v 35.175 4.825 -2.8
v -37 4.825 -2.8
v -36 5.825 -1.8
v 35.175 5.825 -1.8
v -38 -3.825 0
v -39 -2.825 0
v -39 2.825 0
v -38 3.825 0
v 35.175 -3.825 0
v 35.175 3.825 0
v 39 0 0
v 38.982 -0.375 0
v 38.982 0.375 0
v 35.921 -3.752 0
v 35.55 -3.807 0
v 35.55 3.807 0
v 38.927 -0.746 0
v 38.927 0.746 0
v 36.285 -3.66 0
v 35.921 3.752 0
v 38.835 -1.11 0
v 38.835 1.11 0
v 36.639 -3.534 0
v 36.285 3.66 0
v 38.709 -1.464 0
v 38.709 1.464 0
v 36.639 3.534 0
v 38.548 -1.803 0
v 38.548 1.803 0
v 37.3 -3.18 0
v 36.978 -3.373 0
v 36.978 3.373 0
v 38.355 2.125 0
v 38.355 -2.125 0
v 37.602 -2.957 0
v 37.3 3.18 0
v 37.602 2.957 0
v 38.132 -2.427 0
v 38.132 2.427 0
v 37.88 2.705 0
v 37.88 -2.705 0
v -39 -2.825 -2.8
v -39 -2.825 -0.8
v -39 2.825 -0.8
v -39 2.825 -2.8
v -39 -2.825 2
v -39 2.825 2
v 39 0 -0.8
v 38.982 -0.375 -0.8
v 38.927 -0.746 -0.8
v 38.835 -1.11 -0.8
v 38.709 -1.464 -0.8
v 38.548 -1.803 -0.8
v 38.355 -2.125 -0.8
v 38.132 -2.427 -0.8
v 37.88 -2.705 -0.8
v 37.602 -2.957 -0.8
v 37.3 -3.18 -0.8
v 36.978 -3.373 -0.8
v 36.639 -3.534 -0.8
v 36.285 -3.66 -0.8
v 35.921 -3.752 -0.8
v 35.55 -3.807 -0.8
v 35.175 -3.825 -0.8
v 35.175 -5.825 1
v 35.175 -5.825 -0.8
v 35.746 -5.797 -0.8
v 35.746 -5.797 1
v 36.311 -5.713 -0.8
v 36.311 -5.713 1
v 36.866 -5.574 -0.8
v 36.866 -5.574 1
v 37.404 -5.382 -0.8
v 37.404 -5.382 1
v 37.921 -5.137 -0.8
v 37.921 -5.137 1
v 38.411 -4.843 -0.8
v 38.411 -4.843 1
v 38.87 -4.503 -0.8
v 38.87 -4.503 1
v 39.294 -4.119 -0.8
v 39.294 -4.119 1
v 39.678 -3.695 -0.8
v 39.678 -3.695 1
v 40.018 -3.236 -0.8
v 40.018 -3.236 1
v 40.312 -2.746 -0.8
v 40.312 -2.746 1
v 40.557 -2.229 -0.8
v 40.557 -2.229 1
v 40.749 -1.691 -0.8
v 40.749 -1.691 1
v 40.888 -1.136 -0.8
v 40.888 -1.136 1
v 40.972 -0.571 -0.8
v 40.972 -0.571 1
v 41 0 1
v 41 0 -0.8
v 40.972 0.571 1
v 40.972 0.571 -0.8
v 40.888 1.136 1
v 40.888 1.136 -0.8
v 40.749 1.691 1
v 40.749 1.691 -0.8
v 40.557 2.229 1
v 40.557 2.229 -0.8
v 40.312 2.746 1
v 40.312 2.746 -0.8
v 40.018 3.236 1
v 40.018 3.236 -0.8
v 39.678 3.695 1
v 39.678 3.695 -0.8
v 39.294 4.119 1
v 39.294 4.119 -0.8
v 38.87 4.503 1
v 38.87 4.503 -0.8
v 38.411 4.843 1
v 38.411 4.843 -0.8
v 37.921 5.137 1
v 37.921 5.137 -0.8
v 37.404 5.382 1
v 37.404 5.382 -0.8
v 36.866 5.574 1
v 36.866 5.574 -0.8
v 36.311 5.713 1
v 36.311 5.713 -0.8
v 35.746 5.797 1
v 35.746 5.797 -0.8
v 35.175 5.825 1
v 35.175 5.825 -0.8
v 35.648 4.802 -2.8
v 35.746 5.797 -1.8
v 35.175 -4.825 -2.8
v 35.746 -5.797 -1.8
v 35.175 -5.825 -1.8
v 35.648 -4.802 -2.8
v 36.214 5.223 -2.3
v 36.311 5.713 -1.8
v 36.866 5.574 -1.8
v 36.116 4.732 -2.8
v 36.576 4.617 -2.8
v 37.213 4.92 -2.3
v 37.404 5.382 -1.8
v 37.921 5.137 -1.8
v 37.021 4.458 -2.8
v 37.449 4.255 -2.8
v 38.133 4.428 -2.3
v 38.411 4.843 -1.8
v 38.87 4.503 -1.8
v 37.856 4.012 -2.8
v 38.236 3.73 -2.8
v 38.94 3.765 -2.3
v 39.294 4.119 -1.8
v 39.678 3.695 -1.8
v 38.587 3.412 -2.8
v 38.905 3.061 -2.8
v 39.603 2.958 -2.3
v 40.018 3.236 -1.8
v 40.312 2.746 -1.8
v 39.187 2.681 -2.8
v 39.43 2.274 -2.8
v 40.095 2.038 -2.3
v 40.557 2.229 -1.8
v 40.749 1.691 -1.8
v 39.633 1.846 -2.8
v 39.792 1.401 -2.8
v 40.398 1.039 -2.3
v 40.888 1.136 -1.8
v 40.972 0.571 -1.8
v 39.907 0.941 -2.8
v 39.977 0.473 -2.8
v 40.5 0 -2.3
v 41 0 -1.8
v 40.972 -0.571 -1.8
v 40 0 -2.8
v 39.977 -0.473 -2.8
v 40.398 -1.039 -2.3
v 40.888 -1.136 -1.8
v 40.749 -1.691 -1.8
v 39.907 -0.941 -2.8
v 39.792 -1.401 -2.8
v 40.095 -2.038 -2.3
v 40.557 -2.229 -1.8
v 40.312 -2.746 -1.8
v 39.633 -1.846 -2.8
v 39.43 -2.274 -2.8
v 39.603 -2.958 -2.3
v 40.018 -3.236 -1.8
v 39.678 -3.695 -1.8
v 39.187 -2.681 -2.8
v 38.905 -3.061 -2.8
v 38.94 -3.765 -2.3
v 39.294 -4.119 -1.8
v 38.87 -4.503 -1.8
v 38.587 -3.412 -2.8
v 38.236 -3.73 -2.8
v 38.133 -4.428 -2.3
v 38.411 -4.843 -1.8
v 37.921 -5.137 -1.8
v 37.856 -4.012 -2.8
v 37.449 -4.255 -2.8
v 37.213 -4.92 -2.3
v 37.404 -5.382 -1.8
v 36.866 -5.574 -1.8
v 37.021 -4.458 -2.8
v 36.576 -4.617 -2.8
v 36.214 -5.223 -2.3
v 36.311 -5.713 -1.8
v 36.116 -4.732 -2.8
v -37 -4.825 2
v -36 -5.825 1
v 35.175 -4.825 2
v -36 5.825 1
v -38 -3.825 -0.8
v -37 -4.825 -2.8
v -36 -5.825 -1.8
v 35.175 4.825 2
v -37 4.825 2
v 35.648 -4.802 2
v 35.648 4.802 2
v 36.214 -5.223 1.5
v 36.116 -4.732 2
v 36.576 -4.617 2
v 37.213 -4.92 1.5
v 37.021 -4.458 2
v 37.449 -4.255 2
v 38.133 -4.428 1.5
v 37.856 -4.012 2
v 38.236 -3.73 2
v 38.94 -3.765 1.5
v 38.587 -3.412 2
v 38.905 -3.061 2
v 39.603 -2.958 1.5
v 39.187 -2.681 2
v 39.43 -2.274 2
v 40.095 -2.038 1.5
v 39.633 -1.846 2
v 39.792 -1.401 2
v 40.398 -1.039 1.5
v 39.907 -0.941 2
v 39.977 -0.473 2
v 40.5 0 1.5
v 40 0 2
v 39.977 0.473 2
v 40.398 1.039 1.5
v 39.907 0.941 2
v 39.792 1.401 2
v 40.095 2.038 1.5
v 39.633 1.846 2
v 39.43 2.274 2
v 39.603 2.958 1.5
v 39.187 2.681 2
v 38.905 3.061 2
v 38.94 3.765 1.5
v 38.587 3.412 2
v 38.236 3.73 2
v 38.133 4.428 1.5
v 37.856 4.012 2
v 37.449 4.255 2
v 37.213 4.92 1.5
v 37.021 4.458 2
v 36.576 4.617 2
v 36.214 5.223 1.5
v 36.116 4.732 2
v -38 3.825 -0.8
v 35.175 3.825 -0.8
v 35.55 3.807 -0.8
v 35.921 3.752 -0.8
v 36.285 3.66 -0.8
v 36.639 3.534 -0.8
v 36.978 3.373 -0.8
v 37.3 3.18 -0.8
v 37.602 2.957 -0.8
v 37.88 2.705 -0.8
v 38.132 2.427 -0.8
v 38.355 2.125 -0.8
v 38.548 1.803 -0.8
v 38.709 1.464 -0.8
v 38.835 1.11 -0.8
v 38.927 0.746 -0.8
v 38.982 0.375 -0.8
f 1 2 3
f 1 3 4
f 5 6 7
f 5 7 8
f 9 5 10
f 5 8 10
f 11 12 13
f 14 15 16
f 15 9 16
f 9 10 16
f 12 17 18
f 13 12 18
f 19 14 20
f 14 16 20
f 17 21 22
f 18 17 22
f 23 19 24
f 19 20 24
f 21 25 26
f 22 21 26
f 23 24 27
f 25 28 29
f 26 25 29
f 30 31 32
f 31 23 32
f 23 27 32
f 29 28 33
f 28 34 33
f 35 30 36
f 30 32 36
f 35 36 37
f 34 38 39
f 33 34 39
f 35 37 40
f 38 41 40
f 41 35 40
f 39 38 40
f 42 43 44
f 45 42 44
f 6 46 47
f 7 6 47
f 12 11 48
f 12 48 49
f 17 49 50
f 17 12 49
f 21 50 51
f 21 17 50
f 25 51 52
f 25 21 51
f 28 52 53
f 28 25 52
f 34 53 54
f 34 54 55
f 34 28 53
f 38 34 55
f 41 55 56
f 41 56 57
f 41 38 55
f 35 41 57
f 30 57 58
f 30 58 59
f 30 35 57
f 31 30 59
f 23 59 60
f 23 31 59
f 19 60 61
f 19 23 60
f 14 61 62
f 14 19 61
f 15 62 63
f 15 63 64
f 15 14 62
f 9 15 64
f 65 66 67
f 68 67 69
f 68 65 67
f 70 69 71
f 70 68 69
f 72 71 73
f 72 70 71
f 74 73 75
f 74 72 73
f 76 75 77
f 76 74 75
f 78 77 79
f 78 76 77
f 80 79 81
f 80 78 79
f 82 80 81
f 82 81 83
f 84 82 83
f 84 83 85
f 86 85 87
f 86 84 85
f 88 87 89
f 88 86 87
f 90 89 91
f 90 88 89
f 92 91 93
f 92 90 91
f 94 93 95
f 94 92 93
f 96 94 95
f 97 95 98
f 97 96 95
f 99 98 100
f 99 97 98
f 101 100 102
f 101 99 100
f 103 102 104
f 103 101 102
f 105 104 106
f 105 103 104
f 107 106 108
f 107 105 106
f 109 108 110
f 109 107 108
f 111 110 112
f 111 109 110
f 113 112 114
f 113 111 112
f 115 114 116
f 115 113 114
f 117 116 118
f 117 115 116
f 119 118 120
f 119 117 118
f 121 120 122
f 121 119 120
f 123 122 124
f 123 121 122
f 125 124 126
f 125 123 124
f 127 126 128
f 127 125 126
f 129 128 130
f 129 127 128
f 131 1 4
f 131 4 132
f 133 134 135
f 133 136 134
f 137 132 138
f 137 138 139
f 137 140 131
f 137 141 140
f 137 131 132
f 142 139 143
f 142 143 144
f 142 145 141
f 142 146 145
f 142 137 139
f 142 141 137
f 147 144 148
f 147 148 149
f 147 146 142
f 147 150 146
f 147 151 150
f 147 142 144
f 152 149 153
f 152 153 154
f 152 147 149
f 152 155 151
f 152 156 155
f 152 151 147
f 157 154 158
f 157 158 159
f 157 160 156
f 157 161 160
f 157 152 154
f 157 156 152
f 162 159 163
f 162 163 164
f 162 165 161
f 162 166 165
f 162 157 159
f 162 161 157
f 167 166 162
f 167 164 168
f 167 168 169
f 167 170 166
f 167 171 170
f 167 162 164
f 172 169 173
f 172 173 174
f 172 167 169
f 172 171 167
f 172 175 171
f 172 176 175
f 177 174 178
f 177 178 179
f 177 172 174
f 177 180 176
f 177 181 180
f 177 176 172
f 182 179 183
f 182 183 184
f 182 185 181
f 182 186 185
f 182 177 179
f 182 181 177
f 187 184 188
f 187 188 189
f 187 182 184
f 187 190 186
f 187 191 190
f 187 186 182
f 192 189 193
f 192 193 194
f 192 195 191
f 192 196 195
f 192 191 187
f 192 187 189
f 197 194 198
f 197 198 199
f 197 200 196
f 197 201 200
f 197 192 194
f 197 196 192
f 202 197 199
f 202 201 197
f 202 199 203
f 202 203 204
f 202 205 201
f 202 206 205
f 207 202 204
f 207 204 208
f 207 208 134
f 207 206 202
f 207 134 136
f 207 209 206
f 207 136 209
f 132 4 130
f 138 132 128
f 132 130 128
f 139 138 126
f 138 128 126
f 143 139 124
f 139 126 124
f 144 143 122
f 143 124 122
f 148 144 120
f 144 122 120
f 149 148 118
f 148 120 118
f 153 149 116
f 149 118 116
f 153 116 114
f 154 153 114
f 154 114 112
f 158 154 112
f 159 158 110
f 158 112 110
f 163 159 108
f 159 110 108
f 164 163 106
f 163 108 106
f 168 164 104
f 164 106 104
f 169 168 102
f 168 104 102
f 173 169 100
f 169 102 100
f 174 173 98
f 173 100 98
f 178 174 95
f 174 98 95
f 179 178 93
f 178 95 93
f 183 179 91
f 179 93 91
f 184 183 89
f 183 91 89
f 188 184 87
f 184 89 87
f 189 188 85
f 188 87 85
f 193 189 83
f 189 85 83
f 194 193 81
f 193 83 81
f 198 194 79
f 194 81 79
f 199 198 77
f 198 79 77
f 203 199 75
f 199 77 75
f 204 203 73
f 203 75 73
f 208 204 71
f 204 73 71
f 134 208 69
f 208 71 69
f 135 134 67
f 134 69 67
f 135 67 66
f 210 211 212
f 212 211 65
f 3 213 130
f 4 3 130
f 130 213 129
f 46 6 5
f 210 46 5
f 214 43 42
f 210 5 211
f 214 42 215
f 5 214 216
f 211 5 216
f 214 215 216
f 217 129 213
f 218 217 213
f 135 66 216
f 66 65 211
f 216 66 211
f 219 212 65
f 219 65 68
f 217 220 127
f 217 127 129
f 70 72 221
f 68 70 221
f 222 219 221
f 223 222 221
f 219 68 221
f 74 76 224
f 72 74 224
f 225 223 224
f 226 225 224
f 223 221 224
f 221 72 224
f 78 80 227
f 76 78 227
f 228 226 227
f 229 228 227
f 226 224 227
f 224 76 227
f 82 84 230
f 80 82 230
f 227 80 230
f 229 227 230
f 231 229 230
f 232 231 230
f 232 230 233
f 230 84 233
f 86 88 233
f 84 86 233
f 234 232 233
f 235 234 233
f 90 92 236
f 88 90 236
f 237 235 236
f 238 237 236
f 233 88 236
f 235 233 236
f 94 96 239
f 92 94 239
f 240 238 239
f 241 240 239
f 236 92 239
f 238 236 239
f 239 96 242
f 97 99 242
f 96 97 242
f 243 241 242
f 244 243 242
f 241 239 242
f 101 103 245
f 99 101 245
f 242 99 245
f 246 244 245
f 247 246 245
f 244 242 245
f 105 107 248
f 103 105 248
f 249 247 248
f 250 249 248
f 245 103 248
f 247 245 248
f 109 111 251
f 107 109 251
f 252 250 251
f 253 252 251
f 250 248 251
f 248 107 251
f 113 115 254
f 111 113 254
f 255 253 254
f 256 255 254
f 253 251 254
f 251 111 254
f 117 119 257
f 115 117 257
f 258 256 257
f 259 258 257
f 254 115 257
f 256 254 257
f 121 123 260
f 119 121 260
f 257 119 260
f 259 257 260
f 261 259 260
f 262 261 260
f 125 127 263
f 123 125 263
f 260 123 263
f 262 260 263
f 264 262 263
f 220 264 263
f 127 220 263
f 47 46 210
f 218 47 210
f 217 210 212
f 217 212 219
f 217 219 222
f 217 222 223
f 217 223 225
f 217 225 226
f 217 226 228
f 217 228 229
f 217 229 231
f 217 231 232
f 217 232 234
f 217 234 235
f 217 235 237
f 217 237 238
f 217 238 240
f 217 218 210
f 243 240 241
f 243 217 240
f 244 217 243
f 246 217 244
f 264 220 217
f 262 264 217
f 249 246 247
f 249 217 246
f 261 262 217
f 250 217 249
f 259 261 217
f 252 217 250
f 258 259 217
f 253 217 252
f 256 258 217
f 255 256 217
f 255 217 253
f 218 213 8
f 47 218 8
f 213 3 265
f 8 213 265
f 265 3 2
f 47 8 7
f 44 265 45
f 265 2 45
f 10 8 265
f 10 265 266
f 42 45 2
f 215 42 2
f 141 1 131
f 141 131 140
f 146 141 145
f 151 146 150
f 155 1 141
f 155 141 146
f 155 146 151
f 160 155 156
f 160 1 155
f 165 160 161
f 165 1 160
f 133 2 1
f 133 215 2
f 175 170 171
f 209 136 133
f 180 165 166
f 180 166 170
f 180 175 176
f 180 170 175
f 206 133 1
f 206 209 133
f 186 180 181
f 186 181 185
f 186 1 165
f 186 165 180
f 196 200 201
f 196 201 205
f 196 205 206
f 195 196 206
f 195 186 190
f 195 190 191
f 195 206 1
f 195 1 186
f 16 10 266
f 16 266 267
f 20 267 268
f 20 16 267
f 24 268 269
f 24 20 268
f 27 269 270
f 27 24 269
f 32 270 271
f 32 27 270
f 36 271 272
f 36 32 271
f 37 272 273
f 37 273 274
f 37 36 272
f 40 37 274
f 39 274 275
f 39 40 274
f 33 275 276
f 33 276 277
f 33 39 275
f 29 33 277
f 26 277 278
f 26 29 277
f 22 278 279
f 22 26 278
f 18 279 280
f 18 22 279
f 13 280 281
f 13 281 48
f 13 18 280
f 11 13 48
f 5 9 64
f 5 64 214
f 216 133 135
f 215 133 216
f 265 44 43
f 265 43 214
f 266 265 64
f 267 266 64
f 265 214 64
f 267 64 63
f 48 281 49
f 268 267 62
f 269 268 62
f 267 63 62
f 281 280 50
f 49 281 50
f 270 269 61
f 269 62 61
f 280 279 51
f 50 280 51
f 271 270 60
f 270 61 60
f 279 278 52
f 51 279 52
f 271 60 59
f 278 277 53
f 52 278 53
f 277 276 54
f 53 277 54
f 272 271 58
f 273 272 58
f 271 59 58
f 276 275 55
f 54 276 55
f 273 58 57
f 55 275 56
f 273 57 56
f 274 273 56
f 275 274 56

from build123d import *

# Parameters (mm, degrees)
F1_DEPTH    = 2
F2_DEPTH    = 0.8
F4_DEPTH    = 2
F5_SIZE     = 1
F6_T1_DEPTH = 18.2300979278


# Not quite as in the source:
# - a fillet or chamfer that OpenCascade refuses, or shapes differently, is made with other operations: its cross-section is extruded or revolved along the edge and cut away or added


with BuildPart() as f1:
    # F0 (on Top) → F1 (new body)
    with BuildSketch(Plane.XY):
        with BuildLine():
            Line((35.175, -3.825), (-39, -3.825))
            Line((-39, -3.825), (-39, -5.825))
            Line((-39, -5.825), (35.175, -5.825))
            ThreePointArc((35.175, -5.825), (39.2938970004, -4.1188970004), (41, 0))
            ThreePointArc((41, 0), (39.2938970004, 4.1188970004), (35.175, 5.825))
            Line((35.175, 5.825), (-39, 5.825))
            Line((-39, 5.825), (-39, 3.825))
            Line((-39, 3.825), (35.175, 3.825))
            ThreePointArc((35.175, 3.825), (37.879683438, 2.704683438), (39, 0))
            ThreePointArc((39, 0), (37.879683438, -2.704683438), (35.175, -3.825))
        make_face()
        with BuildLine():
            Line((-39, 3.825), (-39, -3.825))
            Line((-39, -3.825), (35.175, -3.825))
            ThreePointArc((35.175, -3.825), (37.879683438, -2.704683438), (39, 0))
            ThreePointArc((39, 0), (37.879683438, 2.704683438), (35.175, 3.825))
            Line((35.175, 3.825), (-39, 3.825))
        make_face()
    extrude(amount=F1_DEPTH)

    # F0 (on Top) → F2 (join)
    with BuildSketch(Plane.XY):
        with BuildLine():
            Line((35.175, -3.825), (-39, -3.825))
            Line((-39, -3.825), (-39, -5.825))
            Line((-39, -5.825), (35.175, -5.825))
            ThreePointArc((35.175, -5.825), (39.2938970004, -4.1188970004), (41, 0))
            ThreePointArc((41, 0), (39.2938970004, 4.1188970004), (35.175, 5.825))
            Line((35.175, 5.825), (-39, 5.825))
            Line((-39, 5.825), (-39, 3.825))
            Line((-39, 3.825), (35.175, 3.825))
            ThreePointArc((35.175, 3.825), (37.879683438, 2.704683438), (39, 0))
            ThreePointArc((39, 0), (37.879683438, -2.704683438), (35.175, -3.825))
        make_face()
    extrude(amount=-F2_DEPTH)

    # F3 (on face) → F4 (join)
    with BuildSketch(Plane(origin=(0, 0, -0.8), x_dir=(1, 0, 0), z_dir=(0, 0, -1))):
        with BuildLine():
            Line((-39, 3.825), (-39, -3.825))
            Line((-39, -3.825), (35.175, -3.825))
            ThreePointArc((35.175, -3.825), (39, 0), (35.175, 3.825))
            Line((35.175, 3.825), (-39, 3.825))
        make_face()
        with BuildLine():
            Line((35.175, -3.825), (-39, -3.825))
            Line((-39, -3.825), (-39, -5.825))
            Line((-39, -5.825), (35.175, -5.825))
            ThreePointArc((35.175, -5.825), (41, 0), (35.175, 5.825))
            Line((35.175, 5.825), (-39, 5.825))
            Line((-39, 5.825), (-39, 3.825))
            Line((-39, 3.825), (35.175, 3.825))
            ThreePointArc((35.175, 3.825), (39, 0), (35.175, -3.825))
        make_face()
    extrude(amount=F4_DEPTH)

    # F5
    f5_edges = [f1.edges().sort_by_distance(p)[0] for p in [
        (-1.9125, -5.825, -2.8),
        (-1.9125, -5.825, 2),
    ]]
    chamfer(f5_edges, length=F5_SIZE)

    # F6: chamfer of 3 on 2 edges, made by hand

    # F6_s2 → F6_t1 (cut)
    with BuildSketch(Plane.XY.offset(-9.5150489639)):
        Polygon((-39, -2.825), (-36, -5.825), (-39, -5.825), align=None)
        Polygon((-36, 5.825), (-39, 2.825), (-39, 5.825), align=None)
    extrude(amount=F6_T1_DEPTH, mode=Mode.SUBTRACT)


solid = f1.part
